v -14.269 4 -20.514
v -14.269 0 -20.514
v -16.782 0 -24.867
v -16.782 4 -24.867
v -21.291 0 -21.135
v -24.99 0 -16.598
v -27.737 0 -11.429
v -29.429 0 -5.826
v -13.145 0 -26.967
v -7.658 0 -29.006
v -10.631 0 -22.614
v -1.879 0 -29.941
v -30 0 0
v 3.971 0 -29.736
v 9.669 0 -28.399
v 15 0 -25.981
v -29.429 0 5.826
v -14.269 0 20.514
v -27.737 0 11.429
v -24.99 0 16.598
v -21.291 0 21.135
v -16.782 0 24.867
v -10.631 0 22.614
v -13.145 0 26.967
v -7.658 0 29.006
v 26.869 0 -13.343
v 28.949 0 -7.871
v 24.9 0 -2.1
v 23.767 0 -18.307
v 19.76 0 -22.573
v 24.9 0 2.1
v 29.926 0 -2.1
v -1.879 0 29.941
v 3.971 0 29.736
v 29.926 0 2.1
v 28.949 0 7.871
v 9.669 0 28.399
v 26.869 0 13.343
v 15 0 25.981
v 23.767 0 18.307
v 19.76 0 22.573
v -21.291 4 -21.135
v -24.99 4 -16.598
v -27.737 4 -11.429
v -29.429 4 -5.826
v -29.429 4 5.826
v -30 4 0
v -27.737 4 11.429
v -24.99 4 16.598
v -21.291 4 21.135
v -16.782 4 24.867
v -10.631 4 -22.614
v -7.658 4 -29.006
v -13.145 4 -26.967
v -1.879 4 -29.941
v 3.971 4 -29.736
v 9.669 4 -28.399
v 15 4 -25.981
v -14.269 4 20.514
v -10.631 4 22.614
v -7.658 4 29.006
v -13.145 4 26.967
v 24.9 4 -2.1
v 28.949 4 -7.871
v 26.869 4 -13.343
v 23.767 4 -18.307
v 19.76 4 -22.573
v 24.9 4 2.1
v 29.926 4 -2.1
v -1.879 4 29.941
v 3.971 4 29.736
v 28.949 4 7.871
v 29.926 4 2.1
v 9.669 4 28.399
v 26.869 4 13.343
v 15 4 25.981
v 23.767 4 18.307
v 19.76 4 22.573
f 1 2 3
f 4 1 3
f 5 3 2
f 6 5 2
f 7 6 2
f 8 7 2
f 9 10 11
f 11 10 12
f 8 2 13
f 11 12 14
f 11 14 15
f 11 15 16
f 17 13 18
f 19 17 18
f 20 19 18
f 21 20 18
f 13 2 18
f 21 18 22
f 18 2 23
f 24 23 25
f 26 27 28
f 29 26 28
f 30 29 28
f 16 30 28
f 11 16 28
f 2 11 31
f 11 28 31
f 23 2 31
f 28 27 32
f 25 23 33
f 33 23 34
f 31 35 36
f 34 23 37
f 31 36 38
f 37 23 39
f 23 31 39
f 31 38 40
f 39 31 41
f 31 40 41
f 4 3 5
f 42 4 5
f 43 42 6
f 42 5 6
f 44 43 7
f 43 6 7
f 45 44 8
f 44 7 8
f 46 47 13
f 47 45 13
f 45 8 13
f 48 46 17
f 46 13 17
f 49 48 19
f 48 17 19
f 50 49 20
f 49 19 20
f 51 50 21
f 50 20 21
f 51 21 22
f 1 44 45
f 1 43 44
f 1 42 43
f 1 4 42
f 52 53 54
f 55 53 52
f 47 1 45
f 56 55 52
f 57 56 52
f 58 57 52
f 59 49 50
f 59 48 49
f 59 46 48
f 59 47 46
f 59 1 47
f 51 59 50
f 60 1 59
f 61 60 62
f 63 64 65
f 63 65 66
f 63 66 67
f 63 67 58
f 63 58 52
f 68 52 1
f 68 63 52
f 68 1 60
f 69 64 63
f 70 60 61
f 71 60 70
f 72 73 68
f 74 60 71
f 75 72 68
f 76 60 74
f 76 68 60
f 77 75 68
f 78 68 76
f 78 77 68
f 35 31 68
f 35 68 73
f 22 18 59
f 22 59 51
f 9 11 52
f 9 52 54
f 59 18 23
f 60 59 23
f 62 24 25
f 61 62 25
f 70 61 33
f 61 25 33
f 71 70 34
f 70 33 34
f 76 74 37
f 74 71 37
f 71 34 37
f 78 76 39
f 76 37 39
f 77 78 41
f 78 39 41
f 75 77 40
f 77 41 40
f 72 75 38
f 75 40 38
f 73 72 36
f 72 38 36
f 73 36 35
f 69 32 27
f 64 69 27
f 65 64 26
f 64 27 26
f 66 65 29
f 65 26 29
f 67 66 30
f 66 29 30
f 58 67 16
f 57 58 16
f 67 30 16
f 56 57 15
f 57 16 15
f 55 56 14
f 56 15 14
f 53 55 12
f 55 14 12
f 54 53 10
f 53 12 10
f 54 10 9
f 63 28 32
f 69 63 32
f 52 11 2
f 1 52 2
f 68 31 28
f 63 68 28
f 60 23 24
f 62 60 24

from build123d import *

# Parameters (mm, degrees)
CROQUIS1_R              = 30
SALIENTE_EXTRUIR1_DEPTH = 4
CORTAR_EXTRUIR2_REACH   = 44.615
CROQUIS2_W              = 10.2
CROQUIS2_H              = 4.2
MATRIZC1_COUNT          = 3


with BuildPart() as part:
    # Croquis1 → Saliente-Extruir1 (new body)
    with BuildSketch(Plane(origin=(0, 0, 0), x_dir=(1, 0, 0), z_dir=(0, 1, 0))):
        with Locations(Location((0, 0, 0), (0, 0, 270))):
            Circle(CROQUIS1_R)
    extrude(amount=SALIENTE_EXTRUIR1_DEPTH)

    # Croquis2 → Cortar-Extruir2 (cut, up to next)
    with BuildSketch(Plane(origin=(0, 0, 0), x_dir=(1, 0, 0), z_dir=(0, 1, 0)), mode=Mode.PRIVATE) as cortar_extruir2_sk1:
        with Locations((30, 0)):
            Rectangle(CROQUIS2_W, CROQUIS2_H)
    cortar_extruir2_tool1 = extrude(cortar_extruir2_sk1.sketch, amount=CORTAR_EXTRUIR2_REACH, mode=Mode.PRIVATE) & part.part
    cortar_extruir2 = cortar_extruir2_tool1.solids().sort_by_distance((30, 0, 0))[0]
    add(cortar_extruir2, mode=Mode.SUBTRACT)

    # MatrizC1: Cortar-Extruir2 ×3 about axis
    matrizc1_axis = Axis((0, 0, 0), (0, 1, 0))
    for i in range(1, MATRIZC1_COUNT):
        add(cortar_extruir2.rotate(matrizc1_axis, i * 360 / MATRIZC1_COUNT), mode=Mode.SUBTRACT)


solid = part.part
